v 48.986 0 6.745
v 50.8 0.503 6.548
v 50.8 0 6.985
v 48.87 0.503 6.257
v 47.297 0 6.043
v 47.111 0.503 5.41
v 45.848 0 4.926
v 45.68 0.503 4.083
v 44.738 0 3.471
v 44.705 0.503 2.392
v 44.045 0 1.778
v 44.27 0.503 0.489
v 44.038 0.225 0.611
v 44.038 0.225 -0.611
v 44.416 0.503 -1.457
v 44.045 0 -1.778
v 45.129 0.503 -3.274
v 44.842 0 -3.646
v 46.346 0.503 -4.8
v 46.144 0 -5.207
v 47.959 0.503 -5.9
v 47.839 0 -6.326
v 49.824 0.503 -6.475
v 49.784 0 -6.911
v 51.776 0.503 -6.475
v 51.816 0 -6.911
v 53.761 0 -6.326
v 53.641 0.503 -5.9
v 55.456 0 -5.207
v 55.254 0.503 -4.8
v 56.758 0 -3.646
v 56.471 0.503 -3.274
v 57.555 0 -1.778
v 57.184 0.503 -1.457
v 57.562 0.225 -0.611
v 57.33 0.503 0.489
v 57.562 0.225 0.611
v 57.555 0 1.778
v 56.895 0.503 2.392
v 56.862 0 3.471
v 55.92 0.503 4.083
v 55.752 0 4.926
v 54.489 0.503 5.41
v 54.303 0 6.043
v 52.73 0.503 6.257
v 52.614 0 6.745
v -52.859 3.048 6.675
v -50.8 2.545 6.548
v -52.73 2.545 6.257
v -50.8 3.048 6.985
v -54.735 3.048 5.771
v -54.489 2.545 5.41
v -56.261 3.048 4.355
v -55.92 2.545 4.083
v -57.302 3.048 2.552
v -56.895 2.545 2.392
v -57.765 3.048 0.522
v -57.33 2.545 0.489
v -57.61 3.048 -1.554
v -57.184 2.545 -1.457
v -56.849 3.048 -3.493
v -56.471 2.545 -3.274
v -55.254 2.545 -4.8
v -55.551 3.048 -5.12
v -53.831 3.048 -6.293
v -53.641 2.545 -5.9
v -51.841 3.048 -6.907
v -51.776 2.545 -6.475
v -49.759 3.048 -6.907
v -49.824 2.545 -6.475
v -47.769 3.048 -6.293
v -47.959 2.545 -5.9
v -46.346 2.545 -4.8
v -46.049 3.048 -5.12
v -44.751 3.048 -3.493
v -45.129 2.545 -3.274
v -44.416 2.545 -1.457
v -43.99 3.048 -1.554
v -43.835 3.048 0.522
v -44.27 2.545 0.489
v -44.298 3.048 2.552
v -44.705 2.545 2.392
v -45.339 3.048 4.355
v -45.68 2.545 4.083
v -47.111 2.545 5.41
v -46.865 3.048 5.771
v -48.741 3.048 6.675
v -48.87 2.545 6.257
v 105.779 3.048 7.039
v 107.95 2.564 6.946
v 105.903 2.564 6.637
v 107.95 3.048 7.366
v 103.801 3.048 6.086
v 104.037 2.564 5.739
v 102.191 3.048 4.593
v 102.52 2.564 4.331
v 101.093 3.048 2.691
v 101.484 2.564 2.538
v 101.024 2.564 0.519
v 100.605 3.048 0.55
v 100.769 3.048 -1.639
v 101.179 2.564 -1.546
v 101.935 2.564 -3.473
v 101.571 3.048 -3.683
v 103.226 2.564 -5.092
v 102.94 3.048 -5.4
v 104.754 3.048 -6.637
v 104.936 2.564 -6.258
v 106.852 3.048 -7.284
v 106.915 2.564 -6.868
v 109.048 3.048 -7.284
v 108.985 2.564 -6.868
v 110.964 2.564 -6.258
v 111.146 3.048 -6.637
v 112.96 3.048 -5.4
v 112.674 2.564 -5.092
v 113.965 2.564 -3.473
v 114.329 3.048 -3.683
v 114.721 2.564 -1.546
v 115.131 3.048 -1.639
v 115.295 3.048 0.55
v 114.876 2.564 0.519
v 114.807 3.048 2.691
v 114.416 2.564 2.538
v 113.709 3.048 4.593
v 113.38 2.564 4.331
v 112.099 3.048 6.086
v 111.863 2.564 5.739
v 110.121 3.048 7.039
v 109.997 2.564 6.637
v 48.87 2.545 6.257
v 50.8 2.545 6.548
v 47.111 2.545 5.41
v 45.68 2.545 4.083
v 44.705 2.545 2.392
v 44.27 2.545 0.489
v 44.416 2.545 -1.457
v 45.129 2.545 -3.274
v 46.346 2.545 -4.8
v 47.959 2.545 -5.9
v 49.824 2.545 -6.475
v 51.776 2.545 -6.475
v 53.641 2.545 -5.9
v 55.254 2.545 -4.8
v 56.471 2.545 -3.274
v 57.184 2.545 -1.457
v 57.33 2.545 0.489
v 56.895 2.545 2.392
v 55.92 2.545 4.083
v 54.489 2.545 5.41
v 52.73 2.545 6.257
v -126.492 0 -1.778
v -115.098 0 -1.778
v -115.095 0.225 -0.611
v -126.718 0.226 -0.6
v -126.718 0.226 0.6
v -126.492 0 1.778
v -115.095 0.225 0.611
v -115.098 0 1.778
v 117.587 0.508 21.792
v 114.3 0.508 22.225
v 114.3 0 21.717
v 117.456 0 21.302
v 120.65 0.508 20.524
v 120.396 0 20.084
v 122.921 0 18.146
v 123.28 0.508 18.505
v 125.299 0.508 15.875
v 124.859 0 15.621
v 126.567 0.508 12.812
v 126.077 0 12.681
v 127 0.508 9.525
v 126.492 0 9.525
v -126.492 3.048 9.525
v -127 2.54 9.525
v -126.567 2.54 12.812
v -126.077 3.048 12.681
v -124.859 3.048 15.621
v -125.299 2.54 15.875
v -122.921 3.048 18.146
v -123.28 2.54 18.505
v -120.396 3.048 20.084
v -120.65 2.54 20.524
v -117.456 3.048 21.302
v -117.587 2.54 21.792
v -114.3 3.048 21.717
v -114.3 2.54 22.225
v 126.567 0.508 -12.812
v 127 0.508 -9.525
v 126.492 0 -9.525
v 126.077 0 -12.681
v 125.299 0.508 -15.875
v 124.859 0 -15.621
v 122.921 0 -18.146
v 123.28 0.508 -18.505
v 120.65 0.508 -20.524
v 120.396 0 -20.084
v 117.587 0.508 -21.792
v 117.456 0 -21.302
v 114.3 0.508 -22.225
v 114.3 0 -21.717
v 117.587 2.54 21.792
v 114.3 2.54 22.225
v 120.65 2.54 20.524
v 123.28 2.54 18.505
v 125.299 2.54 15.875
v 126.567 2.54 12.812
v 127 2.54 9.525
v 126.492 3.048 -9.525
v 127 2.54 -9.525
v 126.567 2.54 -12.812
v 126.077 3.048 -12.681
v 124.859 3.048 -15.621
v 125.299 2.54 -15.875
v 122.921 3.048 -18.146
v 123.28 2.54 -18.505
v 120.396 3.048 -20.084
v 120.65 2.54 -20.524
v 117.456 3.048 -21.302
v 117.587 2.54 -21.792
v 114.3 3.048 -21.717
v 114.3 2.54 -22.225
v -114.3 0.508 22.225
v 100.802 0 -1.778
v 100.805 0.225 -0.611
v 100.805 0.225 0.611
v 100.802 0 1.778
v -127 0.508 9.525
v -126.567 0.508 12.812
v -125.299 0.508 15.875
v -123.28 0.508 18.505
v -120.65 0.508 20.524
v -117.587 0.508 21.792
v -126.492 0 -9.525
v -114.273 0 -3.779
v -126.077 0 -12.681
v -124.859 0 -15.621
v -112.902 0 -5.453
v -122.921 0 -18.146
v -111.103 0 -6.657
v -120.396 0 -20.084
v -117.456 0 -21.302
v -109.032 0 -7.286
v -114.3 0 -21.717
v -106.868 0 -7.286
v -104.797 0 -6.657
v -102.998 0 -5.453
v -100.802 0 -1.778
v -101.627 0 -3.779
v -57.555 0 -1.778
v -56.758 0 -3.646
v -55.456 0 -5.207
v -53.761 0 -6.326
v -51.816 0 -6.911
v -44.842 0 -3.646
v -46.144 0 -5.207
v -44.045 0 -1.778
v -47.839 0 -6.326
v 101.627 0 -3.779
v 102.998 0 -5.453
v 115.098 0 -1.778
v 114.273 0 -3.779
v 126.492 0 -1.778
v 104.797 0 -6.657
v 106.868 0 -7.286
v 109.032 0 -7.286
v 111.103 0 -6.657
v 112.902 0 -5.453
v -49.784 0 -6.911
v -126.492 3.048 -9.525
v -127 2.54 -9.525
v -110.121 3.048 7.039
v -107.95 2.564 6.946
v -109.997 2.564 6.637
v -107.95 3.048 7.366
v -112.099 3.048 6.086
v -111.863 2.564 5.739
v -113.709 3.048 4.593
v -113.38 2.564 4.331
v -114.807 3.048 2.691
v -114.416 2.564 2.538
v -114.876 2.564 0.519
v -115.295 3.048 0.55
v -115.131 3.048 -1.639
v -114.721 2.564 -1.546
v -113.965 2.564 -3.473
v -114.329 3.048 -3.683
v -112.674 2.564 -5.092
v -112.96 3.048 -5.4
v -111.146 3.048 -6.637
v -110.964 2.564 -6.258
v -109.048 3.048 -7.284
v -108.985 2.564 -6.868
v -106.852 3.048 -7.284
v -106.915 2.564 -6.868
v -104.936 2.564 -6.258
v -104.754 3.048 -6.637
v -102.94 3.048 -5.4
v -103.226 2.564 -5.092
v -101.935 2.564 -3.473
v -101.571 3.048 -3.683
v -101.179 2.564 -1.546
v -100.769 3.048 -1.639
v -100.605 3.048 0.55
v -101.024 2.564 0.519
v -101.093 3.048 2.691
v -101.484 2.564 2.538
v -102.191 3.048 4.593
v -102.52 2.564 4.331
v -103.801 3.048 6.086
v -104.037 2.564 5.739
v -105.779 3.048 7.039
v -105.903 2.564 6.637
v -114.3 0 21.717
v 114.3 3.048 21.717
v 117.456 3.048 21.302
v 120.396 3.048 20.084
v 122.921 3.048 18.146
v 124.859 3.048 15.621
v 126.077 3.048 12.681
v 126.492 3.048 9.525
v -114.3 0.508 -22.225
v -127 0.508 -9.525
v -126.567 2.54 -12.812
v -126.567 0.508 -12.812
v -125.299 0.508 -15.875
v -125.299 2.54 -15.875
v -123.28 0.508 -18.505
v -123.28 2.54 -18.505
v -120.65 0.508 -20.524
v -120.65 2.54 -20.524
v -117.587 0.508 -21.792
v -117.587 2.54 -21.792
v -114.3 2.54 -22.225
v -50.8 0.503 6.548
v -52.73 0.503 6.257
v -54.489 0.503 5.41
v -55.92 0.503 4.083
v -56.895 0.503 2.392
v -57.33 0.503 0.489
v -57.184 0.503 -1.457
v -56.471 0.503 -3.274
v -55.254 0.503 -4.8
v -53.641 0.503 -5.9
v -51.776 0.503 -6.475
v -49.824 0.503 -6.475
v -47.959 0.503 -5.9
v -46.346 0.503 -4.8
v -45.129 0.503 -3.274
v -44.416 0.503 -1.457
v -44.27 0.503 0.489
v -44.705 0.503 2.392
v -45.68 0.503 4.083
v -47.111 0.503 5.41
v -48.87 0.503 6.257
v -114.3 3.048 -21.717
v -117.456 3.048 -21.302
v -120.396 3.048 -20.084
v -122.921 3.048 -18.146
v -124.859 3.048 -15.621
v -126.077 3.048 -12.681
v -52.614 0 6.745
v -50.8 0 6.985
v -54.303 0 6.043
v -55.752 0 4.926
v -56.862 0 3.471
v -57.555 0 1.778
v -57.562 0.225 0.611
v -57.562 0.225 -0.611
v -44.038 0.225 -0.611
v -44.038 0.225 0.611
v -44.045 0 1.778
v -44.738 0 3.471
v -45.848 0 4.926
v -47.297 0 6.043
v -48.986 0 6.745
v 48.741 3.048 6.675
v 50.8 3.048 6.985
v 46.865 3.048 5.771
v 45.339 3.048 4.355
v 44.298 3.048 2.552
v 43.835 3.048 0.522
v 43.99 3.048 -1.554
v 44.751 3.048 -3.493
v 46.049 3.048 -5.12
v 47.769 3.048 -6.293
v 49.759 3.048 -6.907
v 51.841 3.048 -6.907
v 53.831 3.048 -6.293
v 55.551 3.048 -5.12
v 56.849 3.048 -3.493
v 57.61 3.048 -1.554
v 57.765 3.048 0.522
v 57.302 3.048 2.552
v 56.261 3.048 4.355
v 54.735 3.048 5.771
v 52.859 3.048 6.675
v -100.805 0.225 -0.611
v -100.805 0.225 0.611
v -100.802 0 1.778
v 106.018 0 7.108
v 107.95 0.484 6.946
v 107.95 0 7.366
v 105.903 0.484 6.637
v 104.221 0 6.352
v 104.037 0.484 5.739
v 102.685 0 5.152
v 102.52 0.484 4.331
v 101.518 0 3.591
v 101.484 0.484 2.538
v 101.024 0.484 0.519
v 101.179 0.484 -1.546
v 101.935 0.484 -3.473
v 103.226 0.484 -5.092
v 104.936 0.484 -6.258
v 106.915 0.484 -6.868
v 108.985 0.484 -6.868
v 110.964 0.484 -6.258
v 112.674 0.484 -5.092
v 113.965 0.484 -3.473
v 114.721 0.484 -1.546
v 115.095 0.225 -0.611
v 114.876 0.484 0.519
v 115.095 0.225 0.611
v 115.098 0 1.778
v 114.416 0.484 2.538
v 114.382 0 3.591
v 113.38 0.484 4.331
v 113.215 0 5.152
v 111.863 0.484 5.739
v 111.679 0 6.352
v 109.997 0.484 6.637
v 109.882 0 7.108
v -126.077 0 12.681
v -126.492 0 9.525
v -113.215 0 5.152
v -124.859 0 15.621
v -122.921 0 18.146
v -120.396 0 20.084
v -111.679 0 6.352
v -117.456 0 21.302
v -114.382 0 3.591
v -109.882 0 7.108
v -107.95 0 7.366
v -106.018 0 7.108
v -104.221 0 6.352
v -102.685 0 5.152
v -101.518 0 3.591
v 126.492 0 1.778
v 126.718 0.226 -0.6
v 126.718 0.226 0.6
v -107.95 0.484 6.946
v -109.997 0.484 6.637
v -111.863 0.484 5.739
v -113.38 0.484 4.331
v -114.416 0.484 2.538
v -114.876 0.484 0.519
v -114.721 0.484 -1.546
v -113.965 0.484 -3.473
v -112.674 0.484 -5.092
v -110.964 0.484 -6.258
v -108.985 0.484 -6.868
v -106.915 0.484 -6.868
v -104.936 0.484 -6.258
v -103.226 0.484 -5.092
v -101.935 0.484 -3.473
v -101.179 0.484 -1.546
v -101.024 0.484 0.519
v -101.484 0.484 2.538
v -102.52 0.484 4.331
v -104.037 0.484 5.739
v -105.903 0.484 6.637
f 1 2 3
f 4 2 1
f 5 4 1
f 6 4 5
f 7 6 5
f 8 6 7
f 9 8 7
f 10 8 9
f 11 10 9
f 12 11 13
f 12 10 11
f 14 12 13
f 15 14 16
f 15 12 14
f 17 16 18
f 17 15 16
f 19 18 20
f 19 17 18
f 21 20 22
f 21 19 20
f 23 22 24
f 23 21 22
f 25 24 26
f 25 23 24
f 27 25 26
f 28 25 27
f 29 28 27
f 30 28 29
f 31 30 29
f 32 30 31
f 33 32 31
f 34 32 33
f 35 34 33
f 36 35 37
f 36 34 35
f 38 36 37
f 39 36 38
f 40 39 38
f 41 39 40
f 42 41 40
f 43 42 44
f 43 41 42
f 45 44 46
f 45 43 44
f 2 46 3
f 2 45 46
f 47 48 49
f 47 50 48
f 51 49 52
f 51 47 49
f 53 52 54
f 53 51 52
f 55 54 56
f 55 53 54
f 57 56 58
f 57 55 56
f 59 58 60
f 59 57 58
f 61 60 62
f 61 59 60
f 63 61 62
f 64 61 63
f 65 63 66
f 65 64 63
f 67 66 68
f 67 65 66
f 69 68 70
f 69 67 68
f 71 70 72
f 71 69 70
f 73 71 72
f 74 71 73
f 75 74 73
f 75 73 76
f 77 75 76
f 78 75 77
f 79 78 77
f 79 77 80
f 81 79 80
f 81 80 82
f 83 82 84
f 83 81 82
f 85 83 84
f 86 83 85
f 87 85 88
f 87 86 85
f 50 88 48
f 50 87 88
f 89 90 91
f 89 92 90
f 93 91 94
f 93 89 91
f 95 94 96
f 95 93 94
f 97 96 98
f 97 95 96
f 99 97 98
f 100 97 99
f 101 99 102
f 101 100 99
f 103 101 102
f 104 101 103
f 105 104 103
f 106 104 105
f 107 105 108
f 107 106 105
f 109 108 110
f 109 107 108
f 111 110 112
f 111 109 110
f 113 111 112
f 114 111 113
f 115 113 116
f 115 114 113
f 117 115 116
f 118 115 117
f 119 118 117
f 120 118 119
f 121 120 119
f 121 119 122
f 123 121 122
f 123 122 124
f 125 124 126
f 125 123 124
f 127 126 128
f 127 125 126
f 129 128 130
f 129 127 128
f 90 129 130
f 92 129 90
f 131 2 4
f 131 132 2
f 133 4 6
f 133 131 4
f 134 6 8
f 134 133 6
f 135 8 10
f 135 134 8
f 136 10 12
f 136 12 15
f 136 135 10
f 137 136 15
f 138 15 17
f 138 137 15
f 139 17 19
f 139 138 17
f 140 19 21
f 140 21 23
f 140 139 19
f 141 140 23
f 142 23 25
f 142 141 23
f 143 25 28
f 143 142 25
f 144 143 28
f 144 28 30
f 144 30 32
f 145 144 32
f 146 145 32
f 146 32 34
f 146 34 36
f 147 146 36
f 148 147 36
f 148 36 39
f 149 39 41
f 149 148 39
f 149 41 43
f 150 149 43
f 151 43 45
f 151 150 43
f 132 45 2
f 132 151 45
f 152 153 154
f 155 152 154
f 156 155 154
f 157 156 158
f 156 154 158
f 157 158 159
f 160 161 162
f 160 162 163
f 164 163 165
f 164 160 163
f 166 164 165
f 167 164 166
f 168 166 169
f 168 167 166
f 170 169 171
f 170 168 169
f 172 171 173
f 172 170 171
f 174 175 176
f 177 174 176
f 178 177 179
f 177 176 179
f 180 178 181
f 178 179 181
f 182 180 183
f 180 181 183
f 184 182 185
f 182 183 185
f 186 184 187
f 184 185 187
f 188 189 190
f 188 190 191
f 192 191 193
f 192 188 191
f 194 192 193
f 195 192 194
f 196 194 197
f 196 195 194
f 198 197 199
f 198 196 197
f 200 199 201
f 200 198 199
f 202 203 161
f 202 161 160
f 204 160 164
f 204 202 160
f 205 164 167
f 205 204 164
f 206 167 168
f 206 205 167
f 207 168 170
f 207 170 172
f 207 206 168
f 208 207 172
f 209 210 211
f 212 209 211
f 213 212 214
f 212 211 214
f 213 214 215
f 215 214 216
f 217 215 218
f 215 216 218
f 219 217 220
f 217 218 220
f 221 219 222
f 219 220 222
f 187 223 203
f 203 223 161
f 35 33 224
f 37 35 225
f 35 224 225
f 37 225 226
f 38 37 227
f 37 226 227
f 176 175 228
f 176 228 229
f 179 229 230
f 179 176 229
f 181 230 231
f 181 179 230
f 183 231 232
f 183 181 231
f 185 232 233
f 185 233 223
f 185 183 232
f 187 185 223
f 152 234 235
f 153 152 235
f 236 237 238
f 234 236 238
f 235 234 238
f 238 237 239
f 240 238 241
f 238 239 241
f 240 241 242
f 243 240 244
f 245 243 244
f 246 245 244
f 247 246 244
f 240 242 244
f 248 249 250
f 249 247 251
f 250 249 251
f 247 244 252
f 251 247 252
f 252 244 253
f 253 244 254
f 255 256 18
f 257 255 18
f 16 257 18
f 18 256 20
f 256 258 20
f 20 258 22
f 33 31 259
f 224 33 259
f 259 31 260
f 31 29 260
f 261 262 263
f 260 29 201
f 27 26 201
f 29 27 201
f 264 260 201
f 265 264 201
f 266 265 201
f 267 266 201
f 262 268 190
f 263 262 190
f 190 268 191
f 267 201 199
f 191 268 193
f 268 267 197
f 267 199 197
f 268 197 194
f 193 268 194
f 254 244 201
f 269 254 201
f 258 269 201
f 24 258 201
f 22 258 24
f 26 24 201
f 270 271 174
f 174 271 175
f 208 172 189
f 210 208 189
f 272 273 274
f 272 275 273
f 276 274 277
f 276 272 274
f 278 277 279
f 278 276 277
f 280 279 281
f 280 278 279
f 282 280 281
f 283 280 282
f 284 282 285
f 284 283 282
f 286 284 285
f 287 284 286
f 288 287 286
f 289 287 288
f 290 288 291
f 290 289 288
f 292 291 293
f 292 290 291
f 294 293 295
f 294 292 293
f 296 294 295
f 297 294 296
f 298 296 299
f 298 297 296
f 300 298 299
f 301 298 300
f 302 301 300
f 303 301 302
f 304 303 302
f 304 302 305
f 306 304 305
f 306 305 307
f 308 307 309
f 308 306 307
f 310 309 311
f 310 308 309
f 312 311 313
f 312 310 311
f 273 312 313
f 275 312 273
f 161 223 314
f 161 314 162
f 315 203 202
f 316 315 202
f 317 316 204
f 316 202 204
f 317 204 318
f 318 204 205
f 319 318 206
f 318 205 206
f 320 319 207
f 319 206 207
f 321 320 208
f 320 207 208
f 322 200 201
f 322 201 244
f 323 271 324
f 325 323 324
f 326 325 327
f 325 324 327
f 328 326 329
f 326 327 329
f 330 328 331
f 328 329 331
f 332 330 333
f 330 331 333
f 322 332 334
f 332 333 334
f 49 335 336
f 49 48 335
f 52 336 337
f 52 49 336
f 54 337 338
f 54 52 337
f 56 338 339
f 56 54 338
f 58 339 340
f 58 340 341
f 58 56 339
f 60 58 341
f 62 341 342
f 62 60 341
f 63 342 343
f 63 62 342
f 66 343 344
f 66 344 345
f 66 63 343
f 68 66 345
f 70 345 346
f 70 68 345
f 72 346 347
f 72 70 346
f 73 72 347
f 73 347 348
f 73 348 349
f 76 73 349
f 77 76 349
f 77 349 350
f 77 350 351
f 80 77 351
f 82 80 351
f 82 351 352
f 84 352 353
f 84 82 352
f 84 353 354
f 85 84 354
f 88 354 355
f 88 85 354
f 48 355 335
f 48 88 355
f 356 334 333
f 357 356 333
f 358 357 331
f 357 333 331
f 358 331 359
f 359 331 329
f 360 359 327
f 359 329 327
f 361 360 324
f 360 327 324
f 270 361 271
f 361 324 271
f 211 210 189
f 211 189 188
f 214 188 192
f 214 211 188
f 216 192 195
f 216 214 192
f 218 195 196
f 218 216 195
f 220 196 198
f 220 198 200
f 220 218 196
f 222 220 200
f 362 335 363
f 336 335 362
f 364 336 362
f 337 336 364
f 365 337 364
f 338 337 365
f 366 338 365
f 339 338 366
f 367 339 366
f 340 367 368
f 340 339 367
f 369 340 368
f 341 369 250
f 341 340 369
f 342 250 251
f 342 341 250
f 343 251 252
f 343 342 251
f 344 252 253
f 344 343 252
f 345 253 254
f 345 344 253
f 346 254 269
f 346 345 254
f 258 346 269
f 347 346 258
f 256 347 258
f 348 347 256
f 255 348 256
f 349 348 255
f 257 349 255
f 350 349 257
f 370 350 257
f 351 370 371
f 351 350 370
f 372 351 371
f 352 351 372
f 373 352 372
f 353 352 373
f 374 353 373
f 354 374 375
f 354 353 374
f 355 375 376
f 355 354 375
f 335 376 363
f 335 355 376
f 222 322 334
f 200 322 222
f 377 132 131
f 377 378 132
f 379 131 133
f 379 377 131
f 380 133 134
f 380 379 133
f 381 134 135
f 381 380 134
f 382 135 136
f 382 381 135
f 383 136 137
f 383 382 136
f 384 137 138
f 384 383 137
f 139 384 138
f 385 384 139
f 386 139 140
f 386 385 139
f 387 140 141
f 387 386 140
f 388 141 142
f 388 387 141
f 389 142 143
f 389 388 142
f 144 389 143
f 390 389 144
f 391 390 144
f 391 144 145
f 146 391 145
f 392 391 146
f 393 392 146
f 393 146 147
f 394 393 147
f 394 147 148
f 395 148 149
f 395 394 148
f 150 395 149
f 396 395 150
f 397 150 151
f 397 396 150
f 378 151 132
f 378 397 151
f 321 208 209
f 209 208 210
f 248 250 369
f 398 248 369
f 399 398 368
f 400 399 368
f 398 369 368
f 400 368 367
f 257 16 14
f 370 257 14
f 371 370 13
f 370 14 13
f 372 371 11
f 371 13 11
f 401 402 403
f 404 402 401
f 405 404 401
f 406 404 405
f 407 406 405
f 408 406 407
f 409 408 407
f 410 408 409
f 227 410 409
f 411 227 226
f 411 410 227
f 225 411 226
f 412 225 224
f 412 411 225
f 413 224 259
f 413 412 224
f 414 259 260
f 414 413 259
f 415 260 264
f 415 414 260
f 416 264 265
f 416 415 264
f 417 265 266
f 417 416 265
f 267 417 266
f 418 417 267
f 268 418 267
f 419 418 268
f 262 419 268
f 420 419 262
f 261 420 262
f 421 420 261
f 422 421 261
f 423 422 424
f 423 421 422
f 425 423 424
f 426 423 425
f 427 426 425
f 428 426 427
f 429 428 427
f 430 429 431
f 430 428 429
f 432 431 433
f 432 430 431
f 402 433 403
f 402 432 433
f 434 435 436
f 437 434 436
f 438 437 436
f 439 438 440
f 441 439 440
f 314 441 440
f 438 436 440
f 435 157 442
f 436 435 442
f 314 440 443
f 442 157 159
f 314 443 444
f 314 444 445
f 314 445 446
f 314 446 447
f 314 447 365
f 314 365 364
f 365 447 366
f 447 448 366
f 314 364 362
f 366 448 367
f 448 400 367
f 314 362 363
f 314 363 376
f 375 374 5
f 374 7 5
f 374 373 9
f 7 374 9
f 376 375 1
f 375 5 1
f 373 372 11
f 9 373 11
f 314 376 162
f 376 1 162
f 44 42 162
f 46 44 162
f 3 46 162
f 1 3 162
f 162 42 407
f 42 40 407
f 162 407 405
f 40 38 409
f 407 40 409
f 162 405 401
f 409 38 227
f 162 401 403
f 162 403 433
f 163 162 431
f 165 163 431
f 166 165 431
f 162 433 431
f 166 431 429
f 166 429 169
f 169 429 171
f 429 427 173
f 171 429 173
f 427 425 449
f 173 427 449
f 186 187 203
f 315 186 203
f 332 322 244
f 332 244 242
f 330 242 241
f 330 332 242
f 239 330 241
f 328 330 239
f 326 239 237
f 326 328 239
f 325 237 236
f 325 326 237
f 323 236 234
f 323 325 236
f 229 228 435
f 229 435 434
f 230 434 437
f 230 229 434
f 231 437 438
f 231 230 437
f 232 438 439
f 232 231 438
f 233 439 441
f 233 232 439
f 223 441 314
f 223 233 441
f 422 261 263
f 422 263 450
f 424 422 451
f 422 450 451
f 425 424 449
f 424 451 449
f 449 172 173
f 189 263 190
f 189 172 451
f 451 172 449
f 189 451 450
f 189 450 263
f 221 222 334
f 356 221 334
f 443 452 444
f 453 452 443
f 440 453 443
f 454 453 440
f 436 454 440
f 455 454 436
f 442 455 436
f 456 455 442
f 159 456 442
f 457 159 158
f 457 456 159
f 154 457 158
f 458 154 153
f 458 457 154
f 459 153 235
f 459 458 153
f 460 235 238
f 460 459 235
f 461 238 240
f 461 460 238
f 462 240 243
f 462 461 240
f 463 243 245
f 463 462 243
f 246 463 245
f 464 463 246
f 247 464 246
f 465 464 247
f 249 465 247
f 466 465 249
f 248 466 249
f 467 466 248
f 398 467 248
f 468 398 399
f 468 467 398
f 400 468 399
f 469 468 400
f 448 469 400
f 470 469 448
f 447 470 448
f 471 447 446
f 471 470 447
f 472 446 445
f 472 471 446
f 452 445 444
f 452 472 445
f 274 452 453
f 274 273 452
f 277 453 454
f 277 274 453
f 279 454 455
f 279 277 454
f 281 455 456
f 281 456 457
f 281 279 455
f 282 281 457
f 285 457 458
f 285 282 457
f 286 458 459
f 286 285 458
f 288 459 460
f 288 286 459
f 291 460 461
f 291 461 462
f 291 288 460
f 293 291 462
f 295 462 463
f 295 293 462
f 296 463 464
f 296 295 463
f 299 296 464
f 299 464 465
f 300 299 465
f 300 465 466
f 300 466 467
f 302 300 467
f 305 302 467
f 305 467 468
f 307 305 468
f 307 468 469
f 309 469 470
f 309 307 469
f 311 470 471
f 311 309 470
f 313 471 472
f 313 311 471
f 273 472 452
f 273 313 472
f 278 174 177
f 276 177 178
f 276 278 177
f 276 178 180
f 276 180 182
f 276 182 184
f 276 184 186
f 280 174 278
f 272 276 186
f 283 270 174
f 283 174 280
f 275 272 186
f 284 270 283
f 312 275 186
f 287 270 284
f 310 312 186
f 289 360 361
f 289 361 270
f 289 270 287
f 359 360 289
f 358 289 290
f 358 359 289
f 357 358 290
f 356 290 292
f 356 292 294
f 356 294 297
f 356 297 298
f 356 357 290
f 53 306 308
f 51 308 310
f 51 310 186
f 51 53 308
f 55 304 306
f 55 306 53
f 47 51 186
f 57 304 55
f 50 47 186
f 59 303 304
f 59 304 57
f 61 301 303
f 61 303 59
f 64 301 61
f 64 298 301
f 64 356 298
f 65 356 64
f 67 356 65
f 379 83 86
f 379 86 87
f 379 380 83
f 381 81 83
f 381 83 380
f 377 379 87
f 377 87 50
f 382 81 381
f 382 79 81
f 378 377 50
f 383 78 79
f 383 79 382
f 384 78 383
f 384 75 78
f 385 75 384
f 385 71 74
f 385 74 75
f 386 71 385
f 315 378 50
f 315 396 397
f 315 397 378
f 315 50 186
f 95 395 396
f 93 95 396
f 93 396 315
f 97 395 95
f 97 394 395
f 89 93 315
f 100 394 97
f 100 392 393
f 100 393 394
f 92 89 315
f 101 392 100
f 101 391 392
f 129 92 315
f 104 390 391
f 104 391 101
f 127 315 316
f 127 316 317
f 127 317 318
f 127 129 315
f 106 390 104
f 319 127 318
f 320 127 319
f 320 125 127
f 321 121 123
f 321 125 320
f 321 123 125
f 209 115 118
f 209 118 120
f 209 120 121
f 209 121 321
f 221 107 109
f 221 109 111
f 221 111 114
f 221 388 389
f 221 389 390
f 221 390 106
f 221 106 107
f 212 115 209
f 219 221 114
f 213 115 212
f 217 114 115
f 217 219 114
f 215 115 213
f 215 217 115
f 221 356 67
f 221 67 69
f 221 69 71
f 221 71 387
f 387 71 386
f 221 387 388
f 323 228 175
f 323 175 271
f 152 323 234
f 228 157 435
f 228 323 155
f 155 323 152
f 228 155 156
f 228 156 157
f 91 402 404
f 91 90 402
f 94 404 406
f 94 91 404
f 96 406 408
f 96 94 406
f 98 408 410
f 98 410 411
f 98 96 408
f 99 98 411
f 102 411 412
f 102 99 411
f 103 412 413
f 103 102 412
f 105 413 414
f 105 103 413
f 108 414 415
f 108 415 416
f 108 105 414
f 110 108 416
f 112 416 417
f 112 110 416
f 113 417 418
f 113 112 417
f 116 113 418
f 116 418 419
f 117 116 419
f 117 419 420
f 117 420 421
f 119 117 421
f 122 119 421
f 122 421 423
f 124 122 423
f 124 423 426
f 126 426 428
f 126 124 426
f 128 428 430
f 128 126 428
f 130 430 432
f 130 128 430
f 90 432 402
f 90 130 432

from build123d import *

# Parameters (mm, degrees)
SKETCH1_W                        = 254
SKETCH1_H                        = 44.45
EXTRUDE1_DEPTH                   = 3.048
FILLET1_R                        = 12.7
CHAMFER1_SIZE                    = 0.508
EXTRUDE4_DEPTH                   = 255
F_1_2_CLEARANCE_HOLE4_AT_2_COUNT = 2
F_1_2_CLEARANCE_HOLE4_AT_2_PITCH = 101.6
F_1_2_CLEARANCE_HOLE5_AT_2_COUNT = 2
F_1_2_CLEARANCE_HOLE5_AT_2_PITCH = 215.9


with BuildPart() as part:
    # Sketch1 → Extrude1 (new body)
    with BuildSketch(Plane(origin=(0, 0, 0), x_dir=(1, 0, 0), z_dir=(0, 1, 0))):
        Rectangle(SKETCH1_W, SKETCH1_H)
    extrude(amount=EXTRUDE1_DEPTH)

    # Fillet1
    fillet1_edges = [part.edges().sort_by_distance(p)[0] for p in [
        (-127, 1.524, -22.225),
        (127, 1.524, -22.225),
        (127, 1.524, 22.225),
        (-127, 1.524, 22.225),
    ]]
    fillet(fillet1_edges, radius=FILLET1_R)

    # Chamfer1
    chamfer1_edges = [part.edges().sort_by_distance(p)[0] for p in [
        (0, 0, 22.225),
        (0, 3.048, 22.225),
        (-127, 0, 0),
        (0, 0, -22.225),
        (127, 0, 0),
        (-123.280256121, 0, -18.505256121),
        (123.280256121, 0, -18.505256121),
        (123.280256121, 0, 18.505256121),
        (-123.280256121, 0, 18.505256121),
        (-127, 3.048, 0),
        (127, 3.048, 0),
        (0, 3.048, -22.225),
        (-123.280256121, 3.048, -18.505256121),
        (123.280256121, 3.048, -18.505256121),
        (123.280256121, 3.048, 18.505256121),
        (-123.280256121, 3.048, 18.505256121),
    ]]
    chamfer(chamfer1_edges, length=CHAMFER1_SIZE)

    # Sketch9 → Extrude4 (cut, through all)
    with BuildSketch(Plane(origin=(127, 0, 0), x_dir=(0, 0, -1), z_dir=(1, 0, 0))):
        with BuildLine():
            Line((-1.778, 0), (1.778, 0))
            ThreePointArc((1.778, 0), (0, 0.254), (-1.778, 0))
        make_face()
    extrude(amount=-EXTRUDE4_DEPTH, mode=Mode.SUBTRACT)

    # Sketch10 → 1/2 Clearance Hole4 (revolve, cut)
    with BuildSketch(Plane(origin=(-50.8, 3.048, 0), x_dir=(0, 0, 1), z_dir=(1, 0, 0))):
        Polygon((0, 0), (0, 3.048), (6.985, 3.048), (6.54812, 2.54542705), (6.54812, 0.50257295), (6.985, 0), align=None)
    f_1_2_clearance_hole4 = revolve(axis=Axis((-50.8, 9.398, 0), (0, -1, 0)), mode=Mode.SUBTRACT)

    # 1/2 Clearance Hole4 at 2: 1/2 Clearance Hole4 ×2
    with Locations(*[(i * F_1_2_CLEARANCE_HOLE4_AT_2_PITCH, 0, 0) for i in range(1, F_1_2_CLEARANCE_HOLE4_AT_2_COUNT)]):
        add(f_1_2_clearance_hole4, mode=Mode.SUBTRACT)

    # Sketch12 → 1/2 Clearance Hole5 (revolve, cut)
    with BuildSketch(Plane(origin=(-107.95, 3.048, 0), x_dir=(0, 0, 1), z_dir=(1, 0, 0))):
        Polygon((0, 0), (0, 3.048), (7.366, 3.048), (6.94563, 2.564419633), (6.94563, 0.483580367), (7.366, 0), align=None)
    f_1_2_clearance_hole5 = revolve(axis=Axis((-107.95, 9.398, 0), (0, -1, 0)), mode=Mode.SUBTRACT)

    # 1/2 Clearance Hole5 at 2: 1/2 Clearance Hole5 ×2
    with Locations(*[(i * F_1_2_CLEARANCE_HOLE5_AT_2_PITCH, 0, 0) for i in range(1, F_1_2_CLEARANCE_HOLE5_AT_2_COUNT)]):
        add(f_1_2_clearance_hole5, mode=Mode.SUBTRACT)


solid = part.part
